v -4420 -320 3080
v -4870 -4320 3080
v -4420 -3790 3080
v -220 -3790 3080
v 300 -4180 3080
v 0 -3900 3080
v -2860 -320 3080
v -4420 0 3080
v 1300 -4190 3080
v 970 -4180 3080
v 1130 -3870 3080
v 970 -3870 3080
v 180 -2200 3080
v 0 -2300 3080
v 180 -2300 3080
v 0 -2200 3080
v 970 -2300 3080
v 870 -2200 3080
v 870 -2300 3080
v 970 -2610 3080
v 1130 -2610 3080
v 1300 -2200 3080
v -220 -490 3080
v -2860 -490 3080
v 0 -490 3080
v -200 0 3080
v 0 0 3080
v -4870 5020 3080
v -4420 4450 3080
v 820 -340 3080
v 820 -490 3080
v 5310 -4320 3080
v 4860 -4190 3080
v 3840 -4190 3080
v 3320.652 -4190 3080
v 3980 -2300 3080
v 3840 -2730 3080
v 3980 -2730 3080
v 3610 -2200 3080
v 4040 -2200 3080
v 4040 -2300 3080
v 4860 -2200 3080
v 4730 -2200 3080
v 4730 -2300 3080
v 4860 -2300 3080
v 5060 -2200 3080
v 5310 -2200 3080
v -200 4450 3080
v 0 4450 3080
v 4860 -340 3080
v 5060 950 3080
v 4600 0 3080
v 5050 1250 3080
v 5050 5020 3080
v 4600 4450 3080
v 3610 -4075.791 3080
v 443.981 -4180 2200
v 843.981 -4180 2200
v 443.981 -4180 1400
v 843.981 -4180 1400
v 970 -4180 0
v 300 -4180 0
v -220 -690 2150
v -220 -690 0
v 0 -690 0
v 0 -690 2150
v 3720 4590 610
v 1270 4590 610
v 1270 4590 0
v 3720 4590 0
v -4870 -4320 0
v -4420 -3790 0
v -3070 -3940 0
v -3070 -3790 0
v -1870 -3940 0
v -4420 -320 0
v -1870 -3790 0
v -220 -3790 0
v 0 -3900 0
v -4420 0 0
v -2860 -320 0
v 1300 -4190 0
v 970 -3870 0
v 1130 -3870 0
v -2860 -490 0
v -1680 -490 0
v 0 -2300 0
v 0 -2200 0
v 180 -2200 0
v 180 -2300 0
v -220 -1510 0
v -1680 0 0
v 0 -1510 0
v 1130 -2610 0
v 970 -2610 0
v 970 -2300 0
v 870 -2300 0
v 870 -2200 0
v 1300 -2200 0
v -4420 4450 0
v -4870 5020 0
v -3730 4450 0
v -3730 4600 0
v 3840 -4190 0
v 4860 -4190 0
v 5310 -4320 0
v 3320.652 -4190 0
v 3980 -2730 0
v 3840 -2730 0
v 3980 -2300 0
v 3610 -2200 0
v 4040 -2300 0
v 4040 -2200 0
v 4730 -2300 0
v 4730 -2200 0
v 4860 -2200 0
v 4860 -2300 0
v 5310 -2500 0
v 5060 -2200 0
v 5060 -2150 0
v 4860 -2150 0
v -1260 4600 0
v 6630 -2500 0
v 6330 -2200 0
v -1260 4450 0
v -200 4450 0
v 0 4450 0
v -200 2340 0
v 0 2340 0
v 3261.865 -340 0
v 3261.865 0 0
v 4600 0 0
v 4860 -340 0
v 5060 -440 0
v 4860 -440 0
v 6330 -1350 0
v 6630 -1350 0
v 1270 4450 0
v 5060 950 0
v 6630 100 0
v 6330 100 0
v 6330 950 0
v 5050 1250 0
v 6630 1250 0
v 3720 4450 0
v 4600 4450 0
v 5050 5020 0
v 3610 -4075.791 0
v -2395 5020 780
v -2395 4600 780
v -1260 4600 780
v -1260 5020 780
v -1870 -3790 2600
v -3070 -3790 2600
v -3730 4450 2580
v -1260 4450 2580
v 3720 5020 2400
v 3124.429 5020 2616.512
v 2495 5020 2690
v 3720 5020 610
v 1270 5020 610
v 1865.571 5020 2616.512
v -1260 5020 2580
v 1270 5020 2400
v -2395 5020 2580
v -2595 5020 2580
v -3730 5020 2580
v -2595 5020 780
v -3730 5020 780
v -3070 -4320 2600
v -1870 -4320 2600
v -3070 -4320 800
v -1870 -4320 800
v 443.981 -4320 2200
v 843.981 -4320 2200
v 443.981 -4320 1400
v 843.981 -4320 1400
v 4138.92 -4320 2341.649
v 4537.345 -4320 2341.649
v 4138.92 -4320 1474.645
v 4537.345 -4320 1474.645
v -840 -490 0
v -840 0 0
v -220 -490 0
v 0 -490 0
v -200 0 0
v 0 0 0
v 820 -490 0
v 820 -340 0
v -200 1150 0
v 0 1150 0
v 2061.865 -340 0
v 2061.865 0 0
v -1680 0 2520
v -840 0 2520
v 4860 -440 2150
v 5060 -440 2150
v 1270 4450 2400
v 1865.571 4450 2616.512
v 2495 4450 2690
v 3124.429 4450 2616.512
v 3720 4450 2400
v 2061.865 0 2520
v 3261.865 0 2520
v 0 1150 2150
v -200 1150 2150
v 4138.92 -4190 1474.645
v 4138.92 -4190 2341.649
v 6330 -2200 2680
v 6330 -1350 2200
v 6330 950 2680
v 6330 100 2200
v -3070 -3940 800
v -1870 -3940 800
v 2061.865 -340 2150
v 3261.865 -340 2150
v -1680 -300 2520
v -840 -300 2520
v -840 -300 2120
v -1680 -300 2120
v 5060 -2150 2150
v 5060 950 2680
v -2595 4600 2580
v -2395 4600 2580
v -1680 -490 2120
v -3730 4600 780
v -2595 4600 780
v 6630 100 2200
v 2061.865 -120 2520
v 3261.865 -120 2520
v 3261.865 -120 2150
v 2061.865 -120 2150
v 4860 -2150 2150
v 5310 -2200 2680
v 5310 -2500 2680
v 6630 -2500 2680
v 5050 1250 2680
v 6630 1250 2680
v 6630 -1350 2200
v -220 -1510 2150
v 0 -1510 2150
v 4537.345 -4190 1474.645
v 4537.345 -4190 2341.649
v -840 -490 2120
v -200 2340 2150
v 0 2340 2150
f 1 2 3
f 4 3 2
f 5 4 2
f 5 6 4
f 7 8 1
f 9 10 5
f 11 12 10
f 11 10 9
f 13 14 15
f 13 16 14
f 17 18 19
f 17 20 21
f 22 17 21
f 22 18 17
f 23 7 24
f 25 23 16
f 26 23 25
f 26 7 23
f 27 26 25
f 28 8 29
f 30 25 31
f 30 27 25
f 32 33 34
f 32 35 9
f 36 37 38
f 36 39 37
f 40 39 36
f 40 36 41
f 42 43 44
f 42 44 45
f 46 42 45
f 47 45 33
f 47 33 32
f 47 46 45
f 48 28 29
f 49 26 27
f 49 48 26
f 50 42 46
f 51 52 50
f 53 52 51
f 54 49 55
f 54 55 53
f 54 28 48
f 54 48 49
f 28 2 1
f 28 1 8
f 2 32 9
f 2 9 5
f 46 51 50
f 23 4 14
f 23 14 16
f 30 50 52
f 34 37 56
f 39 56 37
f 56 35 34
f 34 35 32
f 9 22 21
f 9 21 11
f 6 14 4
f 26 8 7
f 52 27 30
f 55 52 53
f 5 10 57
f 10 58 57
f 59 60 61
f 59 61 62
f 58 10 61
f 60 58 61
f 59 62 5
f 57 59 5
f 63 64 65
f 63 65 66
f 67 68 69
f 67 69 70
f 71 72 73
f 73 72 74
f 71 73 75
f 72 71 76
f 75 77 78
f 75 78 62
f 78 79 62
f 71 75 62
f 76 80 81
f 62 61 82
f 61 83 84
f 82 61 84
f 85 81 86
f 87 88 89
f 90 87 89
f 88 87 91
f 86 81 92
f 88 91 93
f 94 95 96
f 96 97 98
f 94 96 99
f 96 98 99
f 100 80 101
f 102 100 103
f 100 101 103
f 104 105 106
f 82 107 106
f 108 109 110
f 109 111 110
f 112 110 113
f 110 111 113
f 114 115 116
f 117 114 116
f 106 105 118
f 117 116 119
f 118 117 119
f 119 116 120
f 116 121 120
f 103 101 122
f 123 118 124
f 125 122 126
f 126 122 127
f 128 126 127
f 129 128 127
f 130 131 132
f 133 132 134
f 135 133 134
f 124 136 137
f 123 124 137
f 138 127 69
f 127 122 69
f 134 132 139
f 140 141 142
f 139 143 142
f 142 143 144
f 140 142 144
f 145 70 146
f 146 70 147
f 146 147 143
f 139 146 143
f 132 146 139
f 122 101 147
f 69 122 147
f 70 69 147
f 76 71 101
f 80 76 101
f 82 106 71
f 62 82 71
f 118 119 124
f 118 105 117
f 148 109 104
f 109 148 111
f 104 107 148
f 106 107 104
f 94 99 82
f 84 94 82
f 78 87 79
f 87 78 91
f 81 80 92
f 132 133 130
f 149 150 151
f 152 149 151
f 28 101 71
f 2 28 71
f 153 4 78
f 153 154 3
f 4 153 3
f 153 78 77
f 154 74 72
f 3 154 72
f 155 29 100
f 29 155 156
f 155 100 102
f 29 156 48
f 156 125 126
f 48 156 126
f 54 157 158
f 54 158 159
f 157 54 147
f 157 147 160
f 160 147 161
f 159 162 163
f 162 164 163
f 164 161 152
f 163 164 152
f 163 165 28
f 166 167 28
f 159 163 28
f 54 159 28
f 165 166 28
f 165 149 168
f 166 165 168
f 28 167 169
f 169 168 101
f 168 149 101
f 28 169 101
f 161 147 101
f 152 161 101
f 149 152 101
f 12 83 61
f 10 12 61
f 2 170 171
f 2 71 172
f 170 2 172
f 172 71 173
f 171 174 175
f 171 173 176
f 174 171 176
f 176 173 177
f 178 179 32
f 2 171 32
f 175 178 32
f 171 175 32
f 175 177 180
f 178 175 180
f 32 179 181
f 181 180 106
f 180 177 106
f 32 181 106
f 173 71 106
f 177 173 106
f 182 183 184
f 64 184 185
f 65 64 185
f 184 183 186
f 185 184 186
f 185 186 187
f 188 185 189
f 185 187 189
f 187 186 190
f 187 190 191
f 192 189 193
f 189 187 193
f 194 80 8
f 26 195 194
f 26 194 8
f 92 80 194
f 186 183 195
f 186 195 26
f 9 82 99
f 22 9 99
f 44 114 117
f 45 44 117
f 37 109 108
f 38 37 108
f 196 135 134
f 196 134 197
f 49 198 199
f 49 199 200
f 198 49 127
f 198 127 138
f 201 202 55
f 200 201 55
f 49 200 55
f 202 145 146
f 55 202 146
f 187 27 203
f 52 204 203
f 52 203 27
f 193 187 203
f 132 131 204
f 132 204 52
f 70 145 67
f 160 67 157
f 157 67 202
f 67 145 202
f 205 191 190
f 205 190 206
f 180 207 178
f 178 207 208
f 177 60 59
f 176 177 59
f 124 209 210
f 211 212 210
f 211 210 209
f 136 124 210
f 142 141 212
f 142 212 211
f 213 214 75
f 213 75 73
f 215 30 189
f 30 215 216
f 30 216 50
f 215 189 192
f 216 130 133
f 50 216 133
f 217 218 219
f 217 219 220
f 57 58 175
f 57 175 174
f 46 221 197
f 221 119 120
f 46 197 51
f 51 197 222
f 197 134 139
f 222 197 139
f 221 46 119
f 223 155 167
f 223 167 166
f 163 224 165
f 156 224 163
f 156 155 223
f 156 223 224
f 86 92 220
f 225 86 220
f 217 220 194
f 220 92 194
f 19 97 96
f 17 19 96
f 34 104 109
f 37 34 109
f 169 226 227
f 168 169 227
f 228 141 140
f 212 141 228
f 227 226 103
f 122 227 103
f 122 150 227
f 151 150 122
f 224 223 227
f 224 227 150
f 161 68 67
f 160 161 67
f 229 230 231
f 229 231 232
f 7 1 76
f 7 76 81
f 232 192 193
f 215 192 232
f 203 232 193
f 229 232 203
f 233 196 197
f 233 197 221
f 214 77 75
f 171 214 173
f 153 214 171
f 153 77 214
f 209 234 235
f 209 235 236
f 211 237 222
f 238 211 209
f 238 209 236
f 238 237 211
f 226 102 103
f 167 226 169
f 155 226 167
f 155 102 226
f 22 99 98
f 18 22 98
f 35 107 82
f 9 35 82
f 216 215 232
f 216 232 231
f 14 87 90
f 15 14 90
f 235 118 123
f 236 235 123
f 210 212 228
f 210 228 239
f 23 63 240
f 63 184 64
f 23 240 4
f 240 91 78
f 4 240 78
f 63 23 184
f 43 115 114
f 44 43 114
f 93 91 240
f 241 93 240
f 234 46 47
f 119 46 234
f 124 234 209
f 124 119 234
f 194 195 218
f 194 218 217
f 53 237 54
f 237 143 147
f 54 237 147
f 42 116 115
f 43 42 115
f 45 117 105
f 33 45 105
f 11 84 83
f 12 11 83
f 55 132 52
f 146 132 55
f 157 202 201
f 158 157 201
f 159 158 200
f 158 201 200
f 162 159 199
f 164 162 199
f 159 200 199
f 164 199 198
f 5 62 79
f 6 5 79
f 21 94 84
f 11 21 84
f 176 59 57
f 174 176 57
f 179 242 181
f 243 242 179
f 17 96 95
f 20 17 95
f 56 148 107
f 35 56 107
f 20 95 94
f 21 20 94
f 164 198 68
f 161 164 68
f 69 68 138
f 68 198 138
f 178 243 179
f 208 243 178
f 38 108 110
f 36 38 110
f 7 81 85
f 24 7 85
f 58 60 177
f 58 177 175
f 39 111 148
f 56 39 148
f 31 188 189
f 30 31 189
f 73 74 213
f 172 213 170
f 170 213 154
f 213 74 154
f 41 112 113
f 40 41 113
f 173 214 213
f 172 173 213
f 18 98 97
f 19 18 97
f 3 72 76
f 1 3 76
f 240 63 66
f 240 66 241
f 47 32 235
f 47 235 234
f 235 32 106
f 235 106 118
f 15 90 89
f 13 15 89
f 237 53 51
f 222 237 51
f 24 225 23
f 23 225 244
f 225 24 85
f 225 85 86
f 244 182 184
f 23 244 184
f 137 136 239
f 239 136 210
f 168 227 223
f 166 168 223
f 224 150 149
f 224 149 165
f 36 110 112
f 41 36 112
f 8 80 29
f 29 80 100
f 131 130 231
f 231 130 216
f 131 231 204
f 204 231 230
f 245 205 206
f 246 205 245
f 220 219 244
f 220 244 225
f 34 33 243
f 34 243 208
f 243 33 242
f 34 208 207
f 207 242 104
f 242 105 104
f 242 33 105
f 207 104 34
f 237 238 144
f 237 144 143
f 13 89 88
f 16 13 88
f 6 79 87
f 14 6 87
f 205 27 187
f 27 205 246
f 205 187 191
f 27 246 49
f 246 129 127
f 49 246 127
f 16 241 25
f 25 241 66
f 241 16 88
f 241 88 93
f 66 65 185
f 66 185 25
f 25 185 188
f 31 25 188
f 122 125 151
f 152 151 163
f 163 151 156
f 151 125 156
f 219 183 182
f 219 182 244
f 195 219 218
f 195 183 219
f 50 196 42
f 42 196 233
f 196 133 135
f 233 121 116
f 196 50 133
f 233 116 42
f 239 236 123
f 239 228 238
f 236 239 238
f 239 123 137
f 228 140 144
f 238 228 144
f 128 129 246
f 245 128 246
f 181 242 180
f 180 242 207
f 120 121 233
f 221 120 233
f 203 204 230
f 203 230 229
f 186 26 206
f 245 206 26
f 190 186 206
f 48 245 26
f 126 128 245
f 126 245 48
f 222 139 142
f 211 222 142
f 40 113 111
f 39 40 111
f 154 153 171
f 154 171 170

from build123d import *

# Parameters (mm, degrees)
F0_W      = 1270
F0_H      = 3150
F0_W_2    = 4220
F0_H_2    = 4450
F0_W_3    = 4600
F1_DEPTH  = 3080
F2_W      = 1200
F2_H      = 2150
F3_DEPTH  = 340
F4_W      = 1200
F4_H      = 370
F5_DEPTH  = 120
F6_W      = 1190
F6_H      = 2150
F7_DEPTH  = 200
F8_W      = 1450
F8_H      = 2200
F9_DEPTH  = 300
F10_W     = 840
F10_H     = 2520
F11_DEPTH = 300
F12_W     = 840
F12_H     = 2120
F13_DEPTH = 190
F14_W     = 820
F14_H     = 2150
F15_DEPTH = 220
F16_W     = 1200
F16_H     = 1800
F17_DEPTH = 530
F18_W     = 1135
F18_H     = 1800
F19_DEPTH = 570
F21_DEPTH = 570
F23_DEPTH = 400
F24_W     = 1710
F24_H     = 2150
F25_DEPTH = 200
F26_W     = 400
F26_H     = 800
F27_DEPTH = 140
F28_W     = 398.4251022339
F28_H     = 867.0030832291
F29_DEPTH = 130
F30_W     = 200
F30_H     = 1800
F31_DEPTH = 150
F32_W     = 2450
F32_H     = 610
F33_DEPTH = 140
F34_W     = 1200
F34_H     = 800
F35_DEPTH = 150


with BuildPart() as f1:
    # F0 (on Top) → F1 (new body)
    with BuildSketch(Plane.XY):
        Polygon((5050, 1250), (5050, 5020), (-4870, 5020), (-4870, -4320), (5310, -4320), (5310, -2500), (6630, -2500), (6630, 1250), align=None)
        Polygon((-2860, -490), (-220, -490), (-220, -3790), (-4420, -3790), (-4420, -320), (-2860, -320), align=None, mode=Mode.SUBTRACT)
        Polygon((0, -2200), (0, -490), (820, -490), (820, -340), (4860, -340), (4860, -2200), (4730, -2200), (4730, -2300), (4860, -2300), (4860, -4190), (3840, -4190), (3840, -2730), (3980, -2730), (3980, -2300), (4040, -2300), (4040, -2200), (3610, -2200), (3610, -4075.7907946323), (3320.6520080566, -4190), (1300, -4190), (1300, -2200), (870, -2200), (870, -2300), (970, -2300), (970, -2610), (1130, -2610), (1130, -3870), (970, -3870), (970, -4180), (300, -4180), (0, -3900), (0, -2300), (180, -2300), (180, -2200), align=None, mode=Mode.SUBTRACT)
        with Locations((5695, -625)):
            Rectangle(F0_W, F0_H, mode=Mode.SUBTRACT)
        with Locations((-2310, 2225)):
            Rectangle(F0_W_2, F0_H_2, mode=Mode.SUBTRACT)
        with Locations((2300, 2225)):
            Rectangle(F0_W_3, F0_H_2, mode=Mode.SUBTRACT)
    extrude(amount=F1_DEPTH)

    # F2 (on face) → F3 (cut, through all)
    with BuildSketch(Plane.XZ.offset(340)):
        with Locations((2661.8651390076, 1075)):
            Rectangle(F2_W, F2_H)
    extrude(amount=-F3_DEPTH, mode=Mode.SUBTRACT)

    # F4 (on face) → F5 (cut)
    with BuildSketch(Plane(origin=(0, 0, 0), x_dir=(-1, 0, 0), z_dir=(0, 1, 0))):
        with Locations((-2661.8651390076, 2335)):
            Rectangle(F4_W, F4_H)
    extrude(amount=-F5_DEPTH, mode=Mode.SUBTRACT)

    # F6 (on face) → F7 (cut, through all)
    with BuildSketch(Plane.YZ):
        with Locations((1745, 1075)):
            Rectangle(F6_W, F6_H)
    extrude(amount=-F7_DEPTH, mode=Mode.SUBTRACT)

    # F8 (on face) → F9 (cut, through all)
    with BuildSketch(Plane(origin=(6330, 0, 0), x_dir=(0, -1, 0), z_dir=(-1, 0, 0))):
        with Locations((625, 1100)):
            Rectangle(F8_W, F8_H)
    extrude(amount=-F9_DEPTH, mode=Mode.SUBTRACT)

    # F10 (on face) → F11 (cut)
    with BuildSketch(Plane(origin=(0, 0, 0), x_dir=(-1, 0, 0), z_dir=(0, 1, 0))):
        with Locations((1260, 1260)):
            Rectangle(F10_W, F10_H)
    extrude(amount=-F11_DEPTH, mode=Mode.SUBTRACT)

    # F12 (on face) → F13 (cut, through all)
    with BuildSketch(Plane(origin=(0, -300, 0), x_dir=(-1, 0, 0), z_dir=(0, 1, 0))):
        with Locations((1260, 1060)):
            Rectangle(F12_W, F12_H)
    extrude(amount=-F13_DEPTH, mode=Mode.SUBTRACT)

    # F14 (on face) → F15 (cut, through all)
    with BuildSketch(Plane(origin=(-220, 0, 0), x_dir=(0, -1, 0), z_dir=(-1, 0, 0))):
        with Locations((1100, 1075)):
            Rectangle(F14_W, F14_H)
    extrude(amount=-F15_DEPTH, mode=Mode.SUBTRACT)

    # F16 (on face) → F17 (cut, through all)
    with BuildSketch(Plane(origin=(0, -3790, 0), x_dir=(-1, 0, 0), z_dir=(0, 1, 0))):
        with Locations((2470, 1700)):
            Rectangle(F16_W, F16_H)
    extrude(amount=-F17_DEPTH, mode=Mode.SUBTRACT)

    # F18 (on face) → F19 (cut, through all)
    with BuildSketch(Plane.XZ.offset(-4450)):
        with Locations((-1827.5, 1680)):
            Rectangle(F18_W, F18_H)
        with Locations((-3162.5, 1680)):
            Rectangle(F18_W, F18_H)
    extrude(amount=-F19_DEPTH, mode=Mode.SUBTRACT)

    # F20 (on face) → F21 (cut, through all)
    with BuildSketch(Plane.XZ.offset(-4450)):
        with BuildLine():
            Line((1270, 610), (3720, 610))
            Line((3720, 610), (3720, 2400))
            ThreePointArc((3720, 2400), (2495, 2690), (1270, 2400))
            Line((1270, 2400), (1270, 610))
        make_face()
    extrude(amount=-F21_DEPTH, mode=Mode.SUBTRACT)

    # F22 (on face) → F23 (cut)
    with BuildSketch(Plane.XY.offset(3080)):
        Polygon((5310, -2200), (5310, -2500), (6630, -2500), (6630, 1250), (5050, 1250), (5060, 950), (6330, 950), (6330, -2200), align=None)
    extrude(amount=-F23_DEPTH, mode=Mode.SUBTRACT)

    # F24 (on face) → F25 (cut, through all)
    with BuildSketch(Plane(origin=(4860, 0, 0), x_dir=(0, -1, 0), z_dir=(-1, 0, 0))):
        with Locations((1295, 1075)):
            Rectangle(F24_W, F24_H)
    extrude(amount=-F25_DEPTH, mode=Mode.SUBTRACT)

    # F26 (on face) → F27 (cut, through all)
    with BuildSketch(Plane(origin=(0, -4180, 0), x_dir=(-1, 0, 0), z_dir=(0, 1, 0))):
        with Locations((-643.9814388752, 1800)):
            Rectangle(F26_W, F26_H)
    extrude(amount=-F27_DEPTH, mode=Mode.SUBTRACT)

    # F28 (on face) → F29 (cut, through all)
    with BuildSketch(Plane(origin=(0, -4190, 0), x_dir=(-1, 0, 0), z_dir=(0, 1, 0))):
        with Locations((-4338.1323814392, 1908.1470370293)):
            Rectangle(F28_W, F28_H)
    extrude(amount=-F29_DEPTH, mode=Mode.SUBTRACT)

    # F30 (on face) → F31 (cut)
    with BuildSketch(Plane.XZ.offset(-4450)):
        Polygon((-2595, 780), (-3730, 780), (-3730, 0), (-1260, 0), (-1260, 780), (-2395, 780), align=None)
        with Locations((-2495, 1680)):
            Rectangle(F30_W, F30_H)
    extrude(amount=-F31_DEPTH, mode=Mode.SUBTRACT)

    # F32 (on face) → F33 (cut)
    with BuildSketch(Plane.XZ.offset(-4450)):
        with Locations((2495, 305)):
            Rectangle(F32_W, F32_H)
    extrude(amount=-F33_DEPTH, mode=Mode.SUBTRACT)

    # F34 (on face) → F35 (cut)
    with BuildSketch(Plane(origin=(0, -3790, 0), x_dir=(-1, 0, 0), z_dir=(0, 1, 0))):
        with Locations((2470, 400)):
            Rectangle(F34_W, F34_H)
    extrude(amount=-F35_DEPTH, mode=Mode.SUBTRACT)


solid = f1.part
